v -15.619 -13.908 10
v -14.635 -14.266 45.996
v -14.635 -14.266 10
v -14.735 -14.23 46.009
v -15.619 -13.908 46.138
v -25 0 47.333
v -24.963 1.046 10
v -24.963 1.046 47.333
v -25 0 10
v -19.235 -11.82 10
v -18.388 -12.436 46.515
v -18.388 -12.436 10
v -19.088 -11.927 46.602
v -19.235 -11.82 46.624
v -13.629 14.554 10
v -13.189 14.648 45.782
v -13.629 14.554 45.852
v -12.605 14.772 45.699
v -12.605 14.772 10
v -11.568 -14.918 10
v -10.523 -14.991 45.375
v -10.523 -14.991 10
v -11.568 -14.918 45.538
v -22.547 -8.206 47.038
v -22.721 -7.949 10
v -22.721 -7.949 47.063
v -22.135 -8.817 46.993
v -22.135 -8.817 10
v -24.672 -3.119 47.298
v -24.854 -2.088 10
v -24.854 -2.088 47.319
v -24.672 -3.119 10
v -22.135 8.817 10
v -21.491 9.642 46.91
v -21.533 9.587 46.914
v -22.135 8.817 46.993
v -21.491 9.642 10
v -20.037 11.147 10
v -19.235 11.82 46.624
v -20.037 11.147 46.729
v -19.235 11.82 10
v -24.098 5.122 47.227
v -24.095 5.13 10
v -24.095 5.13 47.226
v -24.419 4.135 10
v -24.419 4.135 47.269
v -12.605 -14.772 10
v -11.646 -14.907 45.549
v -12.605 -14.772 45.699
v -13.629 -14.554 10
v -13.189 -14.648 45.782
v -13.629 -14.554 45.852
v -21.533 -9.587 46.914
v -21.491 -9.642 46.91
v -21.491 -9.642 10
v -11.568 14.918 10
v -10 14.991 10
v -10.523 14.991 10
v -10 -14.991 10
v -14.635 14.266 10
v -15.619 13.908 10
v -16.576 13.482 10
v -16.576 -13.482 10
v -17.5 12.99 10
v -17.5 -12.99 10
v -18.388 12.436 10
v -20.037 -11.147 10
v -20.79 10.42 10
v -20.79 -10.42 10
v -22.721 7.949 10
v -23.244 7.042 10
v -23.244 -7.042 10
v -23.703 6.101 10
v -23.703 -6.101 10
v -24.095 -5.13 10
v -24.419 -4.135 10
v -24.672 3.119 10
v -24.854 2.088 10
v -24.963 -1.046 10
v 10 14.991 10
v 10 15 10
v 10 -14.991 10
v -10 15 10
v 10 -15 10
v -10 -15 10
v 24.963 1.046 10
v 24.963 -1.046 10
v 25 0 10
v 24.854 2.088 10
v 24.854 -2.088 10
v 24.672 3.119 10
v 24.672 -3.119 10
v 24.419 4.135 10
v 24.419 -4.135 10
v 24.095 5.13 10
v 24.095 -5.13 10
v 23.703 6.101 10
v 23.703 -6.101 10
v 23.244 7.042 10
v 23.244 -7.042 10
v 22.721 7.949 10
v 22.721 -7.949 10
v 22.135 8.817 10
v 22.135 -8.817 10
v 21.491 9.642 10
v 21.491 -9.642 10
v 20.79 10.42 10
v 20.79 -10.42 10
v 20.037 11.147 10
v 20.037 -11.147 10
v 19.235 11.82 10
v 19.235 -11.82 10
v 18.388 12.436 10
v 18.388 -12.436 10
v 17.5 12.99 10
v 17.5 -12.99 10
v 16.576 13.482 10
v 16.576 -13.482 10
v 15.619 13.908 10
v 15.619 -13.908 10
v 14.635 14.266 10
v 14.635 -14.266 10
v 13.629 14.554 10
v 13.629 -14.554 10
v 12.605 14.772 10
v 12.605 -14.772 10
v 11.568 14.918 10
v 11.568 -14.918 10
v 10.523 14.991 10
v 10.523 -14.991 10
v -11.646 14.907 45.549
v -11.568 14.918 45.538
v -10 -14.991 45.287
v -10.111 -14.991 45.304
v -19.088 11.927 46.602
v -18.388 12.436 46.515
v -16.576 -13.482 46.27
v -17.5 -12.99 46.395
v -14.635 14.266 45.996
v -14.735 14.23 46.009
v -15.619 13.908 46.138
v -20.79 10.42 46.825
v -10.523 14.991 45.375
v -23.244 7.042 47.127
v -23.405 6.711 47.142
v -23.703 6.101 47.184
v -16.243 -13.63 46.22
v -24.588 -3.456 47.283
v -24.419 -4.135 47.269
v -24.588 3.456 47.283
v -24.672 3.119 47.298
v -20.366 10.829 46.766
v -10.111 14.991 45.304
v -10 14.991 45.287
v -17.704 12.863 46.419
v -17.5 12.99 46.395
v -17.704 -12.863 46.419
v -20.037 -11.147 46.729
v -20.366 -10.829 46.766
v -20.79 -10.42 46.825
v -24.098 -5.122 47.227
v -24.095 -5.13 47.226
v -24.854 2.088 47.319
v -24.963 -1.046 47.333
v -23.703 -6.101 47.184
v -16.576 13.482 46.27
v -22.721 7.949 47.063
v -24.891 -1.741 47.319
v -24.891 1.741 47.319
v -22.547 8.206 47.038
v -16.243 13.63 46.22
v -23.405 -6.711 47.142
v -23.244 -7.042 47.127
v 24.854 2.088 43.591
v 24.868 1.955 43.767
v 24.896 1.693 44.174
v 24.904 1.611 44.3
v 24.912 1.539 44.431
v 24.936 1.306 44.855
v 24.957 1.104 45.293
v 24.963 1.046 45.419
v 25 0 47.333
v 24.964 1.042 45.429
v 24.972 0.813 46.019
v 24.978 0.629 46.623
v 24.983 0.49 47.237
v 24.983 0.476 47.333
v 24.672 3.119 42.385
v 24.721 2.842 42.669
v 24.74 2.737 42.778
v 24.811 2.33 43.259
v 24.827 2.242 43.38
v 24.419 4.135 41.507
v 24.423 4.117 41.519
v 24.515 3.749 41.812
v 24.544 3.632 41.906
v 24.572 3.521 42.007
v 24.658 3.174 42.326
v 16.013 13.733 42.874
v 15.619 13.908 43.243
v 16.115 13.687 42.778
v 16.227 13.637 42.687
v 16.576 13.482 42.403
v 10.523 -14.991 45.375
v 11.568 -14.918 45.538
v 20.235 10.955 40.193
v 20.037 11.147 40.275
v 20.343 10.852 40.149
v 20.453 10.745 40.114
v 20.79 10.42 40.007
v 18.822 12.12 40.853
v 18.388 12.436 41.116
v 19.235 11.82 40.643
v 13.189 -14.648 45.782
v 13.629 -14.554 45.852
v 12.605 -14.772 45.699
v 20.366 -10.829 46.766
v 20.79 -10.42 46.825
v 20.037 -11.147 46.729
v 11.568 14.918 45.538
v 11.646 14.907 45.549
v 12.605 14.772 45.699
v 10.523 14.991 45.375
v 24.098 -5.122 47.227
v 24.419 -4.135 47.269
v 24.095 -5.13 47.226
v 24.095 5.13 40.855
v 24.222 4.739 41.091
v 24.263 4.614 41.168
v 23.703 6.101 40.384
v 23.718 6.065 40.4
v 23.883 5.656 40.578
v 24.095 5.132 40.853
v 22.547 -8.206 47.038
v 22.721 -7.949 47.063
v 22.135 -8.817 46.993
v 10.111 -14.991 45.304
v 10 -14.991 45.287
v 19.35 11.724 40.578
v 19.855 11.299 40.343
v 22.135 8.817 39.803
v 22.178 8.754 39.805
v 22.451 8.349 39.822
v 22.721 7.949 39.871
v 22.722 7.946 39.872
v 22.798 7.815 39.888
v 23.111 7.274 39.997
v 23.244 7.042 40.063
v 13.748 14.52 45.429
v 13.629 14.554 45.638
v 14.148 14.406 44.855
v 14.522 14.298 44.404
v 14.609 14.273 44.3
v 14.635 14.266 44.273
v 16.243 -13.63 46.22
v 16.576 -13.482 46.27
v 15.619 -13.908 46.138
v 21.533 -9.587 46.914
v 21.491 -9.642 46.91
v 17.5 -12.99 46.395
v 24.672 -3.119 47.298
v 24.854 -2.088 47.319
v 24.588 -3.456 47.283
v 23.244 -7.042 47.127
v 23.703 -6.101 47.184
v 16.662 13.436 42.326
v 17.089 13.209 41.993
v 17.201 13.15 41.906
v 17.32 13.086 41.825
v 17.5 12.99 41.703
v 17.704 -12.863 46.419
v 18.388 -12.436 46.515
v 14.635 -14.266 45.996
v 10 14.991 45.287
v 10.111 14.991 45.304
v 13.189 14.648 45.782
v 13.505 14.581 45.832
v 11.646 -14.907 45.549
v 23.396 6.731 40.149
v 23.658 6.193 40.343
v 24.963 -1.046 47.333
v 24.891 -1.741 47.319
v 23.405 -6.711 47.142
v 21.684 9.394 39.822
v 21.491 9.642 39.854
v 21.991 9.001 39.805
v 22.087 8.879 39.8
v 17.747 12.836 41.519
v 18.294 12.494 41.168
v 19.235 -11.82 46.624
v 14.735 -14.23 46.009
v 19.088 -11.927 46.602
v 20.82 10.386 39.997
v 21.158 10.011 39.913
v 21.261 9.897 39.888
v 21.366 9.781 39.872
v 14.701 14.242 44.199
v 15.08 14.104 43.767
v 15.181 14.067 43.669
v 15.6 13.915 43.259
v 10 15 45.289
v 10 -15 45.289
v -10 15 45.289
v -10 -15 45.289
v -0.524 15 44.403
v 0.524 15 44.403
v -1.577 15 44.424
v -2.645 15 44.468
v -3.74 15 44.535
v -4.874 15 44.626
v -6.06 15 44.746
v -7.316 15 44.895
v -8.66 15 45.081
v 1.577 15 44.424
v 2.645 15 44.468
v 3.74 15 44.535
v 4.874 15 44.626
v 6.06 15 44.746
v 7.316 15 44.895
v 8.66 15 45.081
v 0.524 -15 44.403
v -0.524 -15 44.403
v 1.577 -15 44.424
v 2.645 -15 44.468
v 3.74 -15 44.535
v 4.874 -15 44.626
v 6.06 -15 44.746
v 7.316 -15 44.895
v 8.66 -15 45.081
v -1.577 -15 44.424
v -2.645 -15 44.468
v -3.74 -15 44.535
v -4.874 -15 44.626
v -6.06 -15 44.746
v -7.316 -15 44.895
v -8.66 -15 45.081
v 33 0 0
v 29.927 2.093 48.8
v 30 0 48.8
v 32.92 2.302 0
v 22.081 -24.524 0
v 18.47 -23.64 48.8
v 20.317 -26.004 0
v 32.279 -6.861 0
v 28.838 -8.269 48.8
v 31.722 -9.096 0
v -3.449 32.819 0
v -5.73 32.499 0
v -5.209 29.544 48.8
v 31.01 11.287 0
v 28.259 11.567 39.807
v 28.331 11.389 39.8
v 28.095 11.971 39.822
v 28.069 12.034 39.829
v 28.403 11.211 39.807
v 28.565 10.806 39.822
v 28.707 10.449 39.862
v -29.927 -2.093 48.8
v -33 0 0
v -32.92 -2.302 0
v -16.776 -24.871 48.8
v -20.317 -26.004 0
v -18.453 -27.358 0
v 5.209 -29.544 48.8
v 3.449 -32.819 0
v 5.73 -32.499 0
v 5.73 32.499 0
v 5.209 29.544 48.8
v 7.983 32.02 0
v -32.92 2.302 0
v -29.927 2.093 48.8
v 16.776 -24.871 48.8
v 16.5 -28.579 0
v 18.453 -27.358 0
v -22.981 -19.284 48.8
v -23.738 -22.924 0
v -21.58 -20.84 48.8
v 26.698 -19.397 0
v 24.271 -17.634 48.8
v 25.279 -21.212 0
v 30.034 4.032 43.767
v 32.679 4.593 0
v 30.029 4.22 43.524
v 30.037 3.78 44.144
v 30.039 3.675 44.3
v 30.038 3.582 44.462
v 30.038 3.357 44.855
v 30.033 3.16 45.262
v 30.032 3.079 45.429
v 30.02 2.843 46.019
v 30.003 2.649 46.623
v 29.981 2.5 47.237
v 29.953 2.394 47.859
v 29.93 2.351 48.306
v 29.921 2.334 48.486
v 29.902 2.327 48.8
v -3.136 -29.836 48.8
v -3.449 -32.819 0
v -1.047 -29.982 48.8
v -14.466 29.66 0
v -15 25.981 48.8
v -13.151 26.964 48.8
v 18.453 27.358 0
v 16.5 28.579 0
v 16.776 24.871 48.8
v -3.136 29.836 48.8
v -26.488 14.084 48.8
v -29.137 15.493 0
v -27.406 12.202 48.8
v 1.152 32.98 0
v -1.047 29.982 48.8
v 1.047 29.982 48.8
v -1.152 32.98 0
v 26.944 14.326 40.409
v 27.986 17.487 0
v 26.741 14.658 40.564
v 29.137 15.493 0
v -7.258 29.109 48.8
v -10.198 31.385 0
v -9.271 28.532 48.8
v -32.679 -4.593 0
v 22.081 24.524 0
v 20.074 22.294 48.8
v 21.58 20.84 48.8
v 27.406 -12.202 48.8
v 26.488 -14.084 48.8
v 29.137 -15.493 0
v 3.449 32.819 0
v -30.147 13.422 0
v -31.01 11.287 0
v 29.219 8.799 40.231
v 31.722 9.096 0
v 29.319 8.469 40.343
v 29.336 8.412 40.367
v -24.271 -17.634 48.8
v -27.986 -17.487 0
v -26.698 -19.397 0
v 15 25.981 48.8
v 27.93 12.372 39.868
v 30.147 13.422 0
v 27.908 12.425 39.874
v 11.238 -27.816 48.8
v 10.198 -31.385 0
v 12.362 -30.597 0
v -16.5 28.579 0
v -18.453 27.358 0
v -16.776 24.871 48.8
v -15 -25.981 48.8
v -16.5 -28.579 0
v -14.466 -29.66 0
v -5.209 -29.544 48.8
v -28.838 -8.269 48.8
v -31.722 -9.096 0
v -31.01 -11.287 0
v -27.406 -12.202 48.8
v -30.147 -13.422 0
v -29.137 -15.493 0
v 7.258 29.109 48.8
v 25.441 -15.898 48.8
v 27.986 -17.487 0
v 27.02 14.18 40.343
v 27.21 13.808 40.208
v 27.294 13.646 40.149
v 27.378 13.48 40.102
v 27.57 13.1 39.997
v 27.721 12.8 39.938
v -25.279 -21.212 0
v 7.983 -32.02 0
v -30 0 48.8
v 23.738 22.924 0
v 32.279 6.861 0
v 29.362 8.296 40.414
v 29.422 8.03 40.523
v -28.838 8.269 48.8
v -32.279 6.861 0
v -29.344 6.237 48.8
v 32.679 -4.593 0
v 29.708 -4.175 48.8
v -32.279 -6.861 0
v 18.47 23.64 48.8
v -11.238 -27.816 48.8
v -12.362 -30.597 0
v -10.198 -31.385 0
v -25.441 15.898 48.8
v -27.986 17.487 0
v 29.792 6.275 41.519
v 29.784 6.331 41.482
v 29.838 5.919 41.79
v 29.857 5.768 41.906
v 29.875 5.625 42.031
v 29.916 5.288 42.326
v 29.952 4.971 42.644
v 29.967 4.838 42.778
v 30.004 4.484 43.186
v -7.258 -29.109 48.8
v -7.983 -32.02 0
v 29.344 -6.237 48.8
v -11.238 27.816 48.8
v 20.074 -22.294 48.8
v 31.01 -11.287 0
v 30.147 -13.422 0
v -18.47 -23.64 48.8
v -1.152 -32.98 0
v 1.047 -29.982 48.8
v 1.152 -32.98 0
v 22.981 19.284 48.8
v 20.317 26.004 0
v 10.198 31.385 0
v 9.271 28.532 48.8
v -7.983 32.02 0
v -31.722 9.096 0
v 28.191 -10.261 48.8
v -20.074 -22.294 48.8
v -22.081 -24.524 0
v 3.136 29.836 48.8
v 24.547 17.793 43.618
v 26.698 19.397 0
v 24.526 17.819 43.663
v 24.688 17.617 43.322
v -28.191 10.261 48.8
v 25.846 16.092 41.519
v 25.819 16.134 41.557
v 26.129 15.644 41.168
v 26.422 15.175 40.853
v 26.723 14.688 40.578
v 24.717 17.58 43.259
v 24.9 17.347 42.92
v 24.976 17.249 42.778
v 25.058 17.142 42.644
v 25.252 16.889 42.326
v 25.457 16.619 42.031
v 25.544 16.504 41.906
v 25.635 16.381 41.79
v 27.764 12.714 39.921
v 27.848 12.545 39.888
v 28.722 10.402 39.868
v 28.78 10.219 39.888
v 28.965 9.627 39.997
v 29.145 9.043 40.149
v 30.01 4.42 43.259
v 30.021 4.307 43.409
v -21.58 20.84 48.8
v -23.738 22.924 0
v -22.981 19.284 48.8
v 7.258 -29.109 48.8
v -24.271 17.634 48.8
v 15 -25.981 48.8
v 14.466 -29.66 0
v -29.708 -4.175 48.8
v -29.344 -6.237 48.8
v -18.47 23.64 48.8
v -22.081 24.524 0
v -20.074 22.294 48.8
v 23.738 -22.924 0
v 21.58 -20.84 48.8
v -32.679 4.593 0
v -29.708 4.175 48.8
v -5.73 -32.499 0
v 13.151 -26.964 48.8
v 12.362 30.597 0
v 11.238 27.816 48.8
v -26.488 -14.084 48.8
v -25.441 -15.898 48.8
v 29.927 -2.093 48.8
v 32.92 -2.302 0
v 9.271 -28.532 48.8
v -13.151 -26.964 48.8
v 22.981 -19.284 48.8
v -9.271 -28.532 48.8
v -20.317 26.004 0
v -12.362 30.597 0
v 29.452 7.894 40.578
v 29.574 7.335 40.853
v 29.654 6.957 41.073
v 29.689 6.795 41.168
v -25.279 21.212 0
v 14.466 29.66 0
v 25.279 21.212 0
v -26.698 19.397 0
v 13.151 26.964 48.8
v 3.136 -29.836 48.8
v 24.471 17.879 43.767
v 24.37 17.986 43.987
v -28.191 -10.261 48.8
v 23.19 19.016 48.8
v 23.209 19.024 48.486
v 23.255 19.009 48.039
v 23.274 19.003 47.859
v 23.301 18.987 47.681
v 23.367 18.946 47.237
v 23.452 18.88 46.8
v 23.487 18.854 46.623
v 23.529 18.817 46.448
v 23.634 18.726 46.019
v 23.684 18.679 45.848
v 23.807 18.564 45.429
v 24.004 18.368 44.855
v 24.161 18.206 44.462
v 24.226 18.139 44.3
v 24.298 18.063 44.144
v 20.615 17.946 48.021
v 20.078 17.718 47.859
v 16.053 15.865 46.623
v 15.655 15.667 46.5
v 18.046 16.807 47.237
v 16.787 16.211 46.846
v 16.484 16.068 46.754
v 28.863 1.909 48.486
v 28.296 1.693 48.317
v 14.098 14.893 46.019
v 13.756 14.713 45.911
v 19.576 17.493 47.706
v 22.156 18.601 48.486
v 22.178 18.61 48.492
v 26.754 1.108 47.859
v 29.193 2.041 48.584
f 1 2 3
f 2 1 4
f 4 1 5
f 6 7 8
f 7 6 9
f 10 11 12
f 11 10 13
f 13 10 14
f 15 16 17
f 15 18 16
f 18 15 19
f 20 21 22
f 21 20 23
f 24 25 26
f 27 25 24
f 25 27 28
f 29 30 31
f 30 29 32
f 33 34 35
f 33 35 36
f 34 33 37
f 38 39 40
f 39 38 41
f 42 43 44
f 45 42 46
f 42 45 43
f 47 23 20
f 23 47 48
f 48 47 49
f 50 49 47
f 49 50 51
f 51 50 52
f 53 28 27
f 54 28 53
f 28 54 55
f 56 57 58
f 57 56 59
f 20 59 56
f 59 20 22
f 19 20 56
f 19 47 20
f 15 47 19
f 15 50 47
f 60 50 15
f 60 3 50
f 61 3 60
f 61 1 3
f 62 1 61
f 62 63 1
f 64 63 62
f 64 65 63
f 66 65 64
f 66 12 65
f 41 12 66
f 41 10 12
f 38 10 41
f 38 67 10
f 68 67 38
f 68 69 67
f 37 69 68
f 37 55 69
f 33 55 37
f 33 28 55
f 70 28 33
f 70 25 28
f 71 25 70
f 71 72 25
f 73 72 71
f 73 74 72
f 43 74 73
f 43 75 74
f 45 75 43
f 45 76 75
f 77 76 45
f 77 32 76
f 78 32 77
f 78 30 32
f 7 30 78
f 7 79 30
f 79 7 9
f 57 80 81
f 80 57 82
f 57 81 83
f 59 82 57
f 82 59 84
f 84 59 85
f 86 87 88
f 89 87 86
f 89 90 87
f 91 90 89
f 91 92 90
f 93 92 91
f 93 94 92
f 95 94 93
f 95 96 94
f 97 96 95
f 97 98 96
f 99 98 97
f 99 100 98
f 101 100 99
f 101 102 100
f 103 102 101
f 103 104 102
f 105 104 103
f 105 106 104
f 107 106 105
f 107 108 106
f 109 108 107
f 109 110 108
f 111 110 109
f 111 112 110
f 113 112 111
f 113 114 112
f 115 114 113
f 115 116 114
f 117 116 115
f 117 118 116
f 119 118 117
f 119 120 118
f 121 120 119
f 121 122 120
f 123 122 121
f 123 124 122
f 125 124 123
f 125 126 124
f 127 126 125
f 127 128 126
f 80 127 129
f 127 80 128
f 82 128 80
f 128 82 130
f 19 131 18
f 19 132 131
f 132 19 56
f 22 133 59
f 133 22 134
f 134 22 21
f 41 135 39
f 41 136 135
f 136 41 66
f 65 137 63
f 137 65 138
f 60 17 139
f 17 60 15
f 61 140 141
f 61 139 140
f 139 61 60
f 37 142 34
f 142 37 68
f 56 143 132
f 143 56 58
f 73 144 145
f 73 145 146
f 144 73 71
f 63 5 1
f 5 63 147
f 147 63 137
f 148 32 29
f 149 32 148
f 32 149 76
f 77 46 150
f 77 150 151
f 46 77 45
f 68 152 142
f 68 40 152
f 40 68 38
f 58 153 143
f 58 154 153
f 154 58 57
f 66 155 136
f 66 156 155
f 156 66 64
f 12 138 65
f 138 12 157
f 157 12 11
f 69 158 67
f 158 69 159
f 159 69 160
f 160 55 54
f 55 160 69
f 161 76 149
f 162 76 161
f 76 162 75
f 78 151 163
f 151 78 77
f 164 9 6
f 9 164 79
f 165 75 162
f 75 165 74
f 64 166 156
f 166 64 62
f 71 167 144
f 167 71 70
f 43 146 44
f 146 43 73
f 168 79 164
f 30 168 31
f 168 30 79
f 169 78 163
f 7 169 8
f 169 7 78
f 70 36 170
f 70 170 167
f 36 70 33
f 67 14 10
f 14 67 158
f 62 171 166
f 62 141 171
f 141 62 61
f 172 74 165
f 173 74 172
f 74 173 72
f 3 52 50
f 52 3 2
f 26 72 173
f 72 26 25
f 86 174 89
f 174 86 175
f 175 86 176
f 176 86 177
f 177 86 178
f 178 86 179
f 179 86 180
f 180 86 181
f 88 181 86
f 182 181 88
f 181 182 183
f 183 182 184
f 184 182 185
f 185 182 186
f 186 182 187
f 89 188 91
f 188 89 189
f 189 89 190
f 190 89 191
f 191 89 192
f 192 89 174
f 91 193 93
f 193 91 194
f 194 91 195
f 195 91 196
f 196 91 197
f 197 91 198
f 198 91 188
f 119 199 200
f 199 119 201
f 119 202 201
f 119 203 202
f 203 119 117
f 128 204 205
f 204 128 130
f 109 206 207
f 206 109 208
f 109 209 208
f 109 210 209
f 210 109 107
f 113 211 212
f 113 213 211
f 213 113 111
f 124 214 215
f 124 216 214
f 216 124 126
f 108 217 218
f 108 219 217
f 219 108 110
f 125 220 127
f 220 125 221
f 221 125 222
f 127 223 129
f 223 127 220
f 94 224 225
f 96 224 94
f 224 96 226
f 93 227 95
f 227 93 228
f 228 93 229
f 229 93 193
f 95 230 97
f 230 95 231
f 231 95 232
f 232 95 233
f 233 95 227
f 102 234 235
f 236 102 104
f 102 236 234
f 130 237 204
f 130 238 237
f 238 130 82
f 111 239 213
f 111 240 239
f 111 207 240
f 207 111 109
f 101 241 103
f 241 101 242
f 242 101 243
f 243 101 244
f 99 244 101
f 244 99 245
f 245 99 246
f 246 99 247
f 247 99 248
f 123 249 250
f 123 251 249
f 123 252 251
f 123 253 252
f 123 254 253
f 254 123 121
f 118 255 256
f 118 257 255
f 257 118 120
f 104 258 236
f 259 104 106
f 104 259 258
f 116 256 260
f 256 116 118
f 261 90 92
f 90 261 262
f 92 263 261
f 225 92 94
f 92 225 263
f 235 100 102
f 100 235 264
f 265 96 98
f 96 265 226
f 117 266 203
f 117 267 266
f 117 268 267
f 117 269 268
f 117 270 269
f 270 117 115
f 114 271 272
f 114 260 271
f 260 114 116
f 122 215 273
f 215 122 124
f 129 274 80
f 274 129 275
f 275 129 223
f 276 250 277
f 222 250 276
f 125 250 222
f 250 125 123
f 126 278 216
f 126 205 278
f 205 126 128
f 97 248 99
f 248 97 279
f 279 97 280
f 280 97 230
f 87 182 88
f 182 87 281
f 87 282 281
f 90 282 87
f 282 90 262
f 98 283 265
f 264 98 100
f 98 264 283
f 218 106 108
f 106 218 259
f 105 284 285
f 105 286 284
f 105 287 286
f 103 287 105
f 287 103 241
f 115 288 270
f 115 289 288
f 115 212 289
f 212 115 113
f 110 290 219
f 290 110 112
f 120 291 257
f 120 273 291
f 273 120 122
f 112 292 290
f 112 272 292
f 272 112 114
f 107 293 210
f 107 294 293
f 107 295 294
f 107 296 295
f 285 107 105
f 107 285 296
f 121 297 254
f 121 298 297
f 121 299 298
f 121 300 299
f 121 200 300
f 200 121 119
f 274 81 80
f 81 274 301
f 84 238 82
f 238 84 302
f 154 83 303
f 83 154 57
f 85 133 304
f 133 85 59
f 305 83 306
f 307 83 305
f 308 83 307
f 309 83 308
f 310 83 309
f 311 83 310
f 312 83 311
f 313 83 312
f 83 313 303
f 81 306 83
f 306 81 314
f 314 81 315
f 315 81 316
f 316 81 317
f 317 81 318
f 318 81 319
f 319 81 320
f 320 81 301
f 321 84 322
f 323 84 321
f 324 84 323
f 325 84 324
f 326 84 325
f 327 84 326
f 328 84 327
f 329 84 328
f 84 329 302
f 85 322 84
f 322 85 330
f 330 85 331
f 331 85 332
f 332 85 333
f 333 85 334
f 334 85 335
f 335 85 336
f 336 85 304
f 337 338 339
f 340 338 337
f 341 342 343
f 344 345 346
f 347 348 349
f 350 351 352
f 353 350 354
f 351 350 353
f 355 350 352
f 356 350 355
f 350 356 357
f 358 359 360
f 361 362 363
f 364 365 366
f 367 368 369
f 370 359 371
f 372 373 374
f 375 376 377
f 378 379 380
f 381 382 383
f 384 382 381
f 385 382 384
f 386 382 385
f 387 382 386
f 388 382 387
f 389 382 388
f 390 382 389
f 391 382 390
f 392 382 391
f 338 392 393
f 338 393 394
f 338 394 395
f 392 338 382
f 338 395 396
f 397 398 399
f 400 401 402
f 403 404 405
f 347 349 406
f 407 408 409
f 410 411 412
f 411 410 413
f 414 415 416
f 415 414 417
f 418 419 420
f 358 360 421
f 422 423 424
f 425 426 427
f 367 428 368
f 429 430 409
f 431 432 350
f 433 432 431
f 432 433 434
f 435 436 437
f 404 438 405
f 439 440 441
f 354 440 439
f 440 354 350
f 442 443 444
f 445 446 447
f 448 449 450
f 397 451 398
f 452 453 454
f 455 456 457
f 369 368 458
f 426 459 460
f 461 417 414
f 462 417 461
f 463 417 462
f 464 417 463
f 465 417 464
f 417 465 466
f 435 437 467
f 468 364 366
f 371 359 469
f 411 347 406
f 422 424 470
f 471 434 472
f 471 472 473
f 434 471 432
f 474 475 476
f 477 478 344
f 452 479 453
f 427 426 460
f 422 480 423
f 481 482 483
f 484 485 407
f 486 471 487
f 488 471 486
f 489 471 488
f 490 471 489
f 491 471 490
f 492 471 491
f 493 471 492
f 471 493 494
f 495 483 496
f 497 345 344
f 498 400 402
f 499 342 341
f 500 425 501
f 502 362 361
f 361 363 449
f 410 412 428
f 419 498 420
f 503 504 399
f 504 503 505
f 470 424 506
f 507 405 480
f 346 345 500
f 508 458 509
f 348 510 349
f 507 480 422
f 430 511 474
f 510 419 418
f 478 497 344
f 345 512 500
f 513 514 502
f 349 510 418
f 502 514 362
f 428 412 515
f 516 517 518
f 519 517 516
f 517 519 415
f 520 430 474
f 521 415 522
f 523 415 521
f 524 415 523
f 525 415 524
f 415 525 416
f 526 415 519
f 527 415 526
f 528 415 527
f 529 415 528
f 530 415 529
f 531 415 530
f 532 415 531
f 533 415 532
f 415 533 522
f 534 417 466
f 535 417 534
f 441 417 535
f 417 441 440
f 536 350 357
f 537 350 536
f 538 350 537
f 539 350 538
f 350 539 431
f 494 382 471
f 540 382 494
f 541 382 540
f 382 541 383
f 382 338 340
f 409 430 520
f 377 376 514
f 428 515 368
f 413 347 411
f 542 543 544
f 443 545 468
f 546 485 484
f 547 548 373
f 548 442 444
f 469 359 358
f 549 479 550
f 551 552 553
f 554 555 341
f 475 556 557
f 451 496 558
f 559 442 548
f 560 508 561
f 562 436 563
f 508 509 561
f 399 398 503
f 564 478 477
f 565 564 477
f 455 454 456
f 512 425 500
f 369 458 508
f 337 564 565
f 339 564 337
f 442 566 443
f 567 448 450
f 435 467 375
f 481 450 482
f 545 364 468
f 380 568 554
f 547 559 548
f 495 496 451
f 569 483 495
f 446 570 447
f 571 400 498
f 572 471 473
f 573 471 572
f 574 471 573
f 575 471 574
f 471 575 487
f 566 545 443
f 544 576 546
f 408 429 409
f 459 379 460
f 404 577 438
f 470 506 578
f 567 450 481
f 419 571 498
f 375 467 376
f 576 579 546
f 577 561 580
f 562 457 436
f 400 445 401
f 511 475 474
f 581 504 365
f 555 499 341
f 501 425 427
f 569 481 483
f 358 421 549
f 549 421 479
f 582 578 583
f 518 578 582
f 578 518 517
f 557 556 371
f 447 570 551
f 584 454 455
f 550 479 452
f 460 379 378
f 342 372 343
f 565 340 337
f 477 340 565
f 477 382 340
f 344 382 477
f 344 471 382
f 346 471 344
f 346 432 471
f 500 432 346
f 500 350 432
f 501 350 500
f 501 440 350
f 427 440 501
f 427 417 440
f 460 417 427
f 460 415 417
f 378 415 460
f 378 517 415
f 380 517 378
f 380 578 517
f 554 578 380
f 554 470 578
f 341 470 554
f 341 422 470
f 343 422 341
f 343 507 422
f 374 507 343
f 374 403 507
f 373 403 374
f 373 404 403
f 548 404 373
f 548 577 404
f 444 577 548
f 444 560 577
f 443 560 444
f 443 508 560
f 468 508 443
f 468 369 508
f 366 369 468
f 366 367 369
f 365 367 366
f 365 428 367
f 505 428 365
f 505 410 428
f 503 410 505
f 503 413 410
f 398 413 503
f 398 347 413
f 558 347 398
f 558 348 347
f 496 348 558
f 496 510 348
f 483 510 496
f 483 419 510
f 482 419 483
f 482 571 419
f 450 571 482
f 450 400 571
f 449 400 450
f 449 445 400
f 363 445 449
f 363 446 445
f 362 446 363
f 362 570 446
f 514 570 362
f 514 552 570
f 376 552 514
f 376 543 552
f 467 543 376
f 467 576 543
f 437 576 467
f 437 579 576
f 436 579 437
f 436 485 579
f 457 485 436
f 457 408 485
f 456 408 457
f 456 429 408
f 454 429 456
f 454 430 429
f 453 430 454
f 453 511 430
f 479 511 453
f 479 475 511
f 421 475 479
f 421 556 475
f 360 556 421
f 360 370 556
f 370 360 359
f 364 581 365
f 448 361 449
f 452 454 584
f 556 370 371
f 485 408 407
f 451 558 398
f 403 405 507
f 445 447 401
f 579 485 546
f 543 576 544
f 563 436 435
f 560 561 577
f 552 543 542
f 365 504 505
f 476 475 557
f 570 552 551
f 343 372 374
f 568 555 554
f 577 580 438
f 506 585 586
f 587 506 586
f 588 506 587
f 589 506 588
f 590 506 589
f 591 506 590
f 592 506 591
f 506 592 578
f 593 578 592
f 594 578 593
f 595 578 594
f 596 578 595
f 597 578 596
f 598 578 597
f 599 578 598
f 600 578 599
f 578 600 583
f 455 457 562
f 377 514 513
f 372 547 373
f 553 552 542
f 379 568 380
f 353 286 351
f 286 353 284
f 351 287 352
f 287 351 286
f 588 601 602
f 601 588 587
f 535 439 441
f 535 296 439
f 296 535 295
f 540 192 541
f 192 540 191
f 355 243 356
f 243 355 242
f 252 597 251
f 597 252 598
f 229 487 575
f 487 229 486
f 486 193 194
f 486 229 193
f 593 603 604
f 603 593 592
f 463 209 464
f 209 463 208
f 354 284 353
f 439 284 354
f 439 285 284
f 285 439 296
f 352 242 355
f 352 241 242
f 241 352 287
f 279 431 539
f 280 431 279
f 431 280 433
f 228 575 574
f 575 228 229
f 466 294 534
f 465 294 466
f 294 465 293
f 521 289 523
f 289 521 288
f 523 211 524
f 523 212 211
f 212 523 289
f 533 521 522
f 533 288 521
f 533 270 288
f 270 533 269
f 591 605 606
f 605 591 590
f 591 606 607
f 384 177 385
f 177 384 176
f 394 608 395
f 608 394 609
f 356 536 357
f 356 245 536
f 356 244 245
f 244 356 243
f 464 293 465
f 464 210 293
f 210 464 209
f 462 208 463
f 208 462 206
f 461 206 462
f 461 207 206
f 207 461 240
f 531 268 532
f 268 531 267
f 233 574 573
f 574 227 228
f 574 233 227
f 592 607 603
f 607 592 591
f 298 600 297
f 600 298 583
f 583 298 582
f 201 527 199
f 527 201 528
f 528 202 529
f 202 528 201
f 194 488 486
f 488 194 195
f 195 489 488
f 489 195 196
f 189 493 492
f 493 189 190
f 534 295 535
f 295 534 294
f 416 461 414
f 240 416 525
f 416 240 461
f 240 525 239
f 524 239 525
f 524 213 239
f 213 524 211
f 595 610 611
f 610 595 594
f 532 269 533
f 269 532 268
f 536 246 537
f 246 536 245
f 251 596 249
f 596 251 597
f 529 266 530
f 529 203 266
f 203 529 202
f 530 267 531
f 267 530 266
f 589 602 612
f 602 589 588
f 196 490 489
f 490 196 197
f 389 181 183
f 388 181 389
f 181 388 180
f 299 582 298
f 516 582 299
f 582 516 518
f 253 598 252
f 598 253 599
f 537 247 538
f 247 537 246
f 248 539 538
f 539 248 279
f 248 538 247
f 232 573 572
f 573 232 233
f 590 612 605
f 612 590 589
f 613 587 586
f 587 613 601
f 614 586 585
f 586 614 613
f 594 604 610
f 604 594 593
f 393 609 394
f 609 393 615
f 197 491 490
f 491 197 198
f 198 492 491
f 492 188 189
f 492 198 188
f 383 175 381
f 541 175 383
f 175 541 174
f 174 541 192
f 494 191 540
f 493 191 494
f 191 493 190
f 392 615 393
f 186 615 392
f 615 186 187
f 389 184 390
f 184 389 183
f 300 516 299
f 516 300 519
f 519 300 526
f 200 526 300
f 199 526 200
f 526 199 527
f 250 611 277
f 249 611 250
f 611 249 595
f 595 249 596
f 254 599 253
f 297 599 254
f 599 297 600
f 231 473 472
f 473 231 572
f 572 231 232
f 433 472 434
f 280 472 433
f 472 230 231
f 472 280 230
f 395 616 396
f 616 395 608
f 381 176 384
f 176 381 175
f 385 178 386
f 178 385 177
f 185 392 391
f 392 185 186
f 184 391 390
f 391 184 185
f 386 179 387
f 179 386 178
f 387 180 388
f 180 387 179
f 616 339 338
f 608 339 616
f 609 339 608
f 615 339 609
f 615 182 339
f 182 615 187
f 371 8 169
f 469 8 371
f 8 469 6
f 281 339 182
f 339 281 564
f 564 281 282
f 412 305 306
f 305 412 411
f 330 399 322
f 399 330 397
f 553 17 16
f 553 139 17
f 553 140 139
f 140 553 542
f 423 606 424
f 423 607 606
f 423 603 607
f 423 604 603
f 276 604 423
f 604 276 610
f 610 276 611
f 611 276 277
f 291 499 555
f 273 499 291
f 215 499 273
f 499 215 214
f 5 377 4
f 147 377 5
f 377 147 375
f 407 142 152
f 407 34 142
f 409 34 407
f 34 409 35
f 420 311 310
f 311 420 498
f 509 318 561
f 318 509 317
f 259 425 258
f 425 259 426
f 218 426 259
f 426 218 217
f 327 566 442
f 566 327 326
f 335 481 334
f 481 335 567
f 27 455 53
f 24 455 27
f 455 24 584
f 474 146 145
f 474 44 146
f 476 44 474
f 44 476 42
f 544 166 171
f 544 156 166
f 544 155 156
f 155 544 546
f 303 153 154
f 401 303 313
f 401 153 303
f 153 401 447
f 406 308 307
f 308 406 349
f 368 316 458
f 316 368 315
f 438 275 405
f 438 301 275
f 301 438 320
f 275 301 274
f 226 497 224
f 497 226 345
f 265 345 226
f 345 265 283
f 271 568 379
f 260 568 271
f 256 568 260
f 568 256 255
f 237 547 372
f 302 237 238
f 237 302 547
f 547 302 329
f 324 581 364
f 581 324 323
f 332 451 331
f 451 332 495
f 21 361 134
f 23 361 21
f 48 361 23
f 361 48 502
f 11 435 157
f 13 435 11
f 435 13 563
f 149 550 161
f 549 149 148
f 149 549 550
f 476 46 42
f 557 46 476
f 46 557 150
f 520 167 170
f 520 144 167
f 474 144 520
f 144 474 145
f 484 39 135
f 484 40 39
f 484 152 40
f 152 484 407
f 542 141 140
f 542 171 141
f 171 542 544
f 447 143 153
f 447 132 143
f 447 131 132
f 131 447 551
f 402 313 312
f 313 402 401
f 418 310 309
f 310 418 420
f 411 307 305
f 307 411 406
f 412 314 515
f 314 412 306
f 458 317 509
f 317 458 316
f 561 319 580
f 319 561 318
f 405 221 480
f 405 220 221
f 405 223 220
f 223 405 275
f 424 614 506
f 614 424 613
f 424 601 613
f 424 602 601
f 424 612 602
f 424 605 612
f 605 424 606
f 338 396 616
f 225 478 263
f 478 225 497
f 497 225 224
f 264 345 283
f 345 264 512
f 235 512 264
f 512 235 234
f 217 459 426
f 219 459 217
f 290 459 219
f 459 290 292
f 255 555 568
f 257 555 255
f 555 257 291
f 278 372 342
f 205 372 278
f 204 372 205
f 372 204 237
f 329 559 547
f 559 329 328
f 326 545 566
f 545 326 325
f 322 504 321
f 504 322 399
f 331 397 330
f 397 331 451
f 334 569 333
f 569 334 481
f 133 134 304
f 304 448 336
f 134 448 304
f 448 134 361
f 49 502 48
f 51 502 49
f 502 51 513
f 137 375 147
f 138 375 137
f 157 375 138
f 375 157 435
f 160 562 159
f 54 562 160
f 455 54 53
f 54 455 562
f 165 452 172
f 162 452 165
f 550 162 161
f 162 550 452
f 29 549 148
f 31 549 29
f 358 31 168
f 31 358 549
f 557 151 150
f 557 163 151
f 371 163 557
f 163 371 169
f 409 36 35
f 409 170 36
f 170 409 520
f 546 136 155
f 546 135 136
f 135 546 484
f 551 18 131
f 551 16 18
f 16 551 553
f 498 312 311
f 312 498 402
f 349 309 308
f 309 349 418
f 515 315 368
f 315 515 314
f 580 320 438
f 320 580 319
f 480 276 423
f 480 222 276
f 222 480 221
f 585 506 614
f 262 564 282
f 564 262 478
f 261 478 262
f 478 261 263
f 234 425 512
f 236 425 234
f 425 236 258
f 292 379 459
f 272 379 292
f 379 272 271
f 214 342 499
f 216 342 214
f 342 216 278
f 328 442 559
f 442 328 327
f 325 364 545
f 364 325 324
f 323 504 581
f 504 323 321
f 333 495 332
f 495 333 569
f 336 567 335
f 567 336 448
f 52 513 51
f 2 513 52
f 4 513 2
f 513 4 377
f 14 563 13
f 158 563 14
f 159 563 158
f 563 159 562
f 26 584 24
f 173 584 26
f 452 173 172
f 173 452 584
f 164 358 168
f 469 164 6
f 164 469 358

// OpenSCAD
$fa=4; // default minimum facet angle is now 0.5
$fs=0.05; // default minimum facet size is now 0.05 mm

spoutLen = 50;
spoutWidth = 30;
spoutDepth = 30;

footRatio = 1.1;

outerDiam = 60;

coneLift = 8.8;

baseThickness = 10;

handleAngle = 21.9;
handleDiam = 18;

difference() {
  cylinder(r1 = (outerDiam / 2) * footRatio, r2 = outerDiam / 2, h = spoutDepth + baseThickness + coneLift);

  #translate([0, 0, baseThickness + spoutDepth + coneLift]) rotate([0, 90, handleAngle]) cylinder(r = handleDiam / 2, h = 100);

  translate([0, 0, spoutDepth + baseThickness]) cylinder(r1 = 0, r2 = outerDiam / 2, h = coneLift);

  translate([-(spoutLen - spoutWidth) / 2, 0, baseThickness]) union() {
    cylinder(r = spoutWidth / 2, h = spoutDepth + coneLift);
    translate([spoutLen - spoutWidth, 0, 0]) cylinder(r = spoutWidth / 2, h = spoutDepth + coneLift);
    translate([0, spoutWidth / -2, 0]) cube([spoutLen - spoutWidth, spoutWidth, spoutDepth + coneLift]);
  }
}
